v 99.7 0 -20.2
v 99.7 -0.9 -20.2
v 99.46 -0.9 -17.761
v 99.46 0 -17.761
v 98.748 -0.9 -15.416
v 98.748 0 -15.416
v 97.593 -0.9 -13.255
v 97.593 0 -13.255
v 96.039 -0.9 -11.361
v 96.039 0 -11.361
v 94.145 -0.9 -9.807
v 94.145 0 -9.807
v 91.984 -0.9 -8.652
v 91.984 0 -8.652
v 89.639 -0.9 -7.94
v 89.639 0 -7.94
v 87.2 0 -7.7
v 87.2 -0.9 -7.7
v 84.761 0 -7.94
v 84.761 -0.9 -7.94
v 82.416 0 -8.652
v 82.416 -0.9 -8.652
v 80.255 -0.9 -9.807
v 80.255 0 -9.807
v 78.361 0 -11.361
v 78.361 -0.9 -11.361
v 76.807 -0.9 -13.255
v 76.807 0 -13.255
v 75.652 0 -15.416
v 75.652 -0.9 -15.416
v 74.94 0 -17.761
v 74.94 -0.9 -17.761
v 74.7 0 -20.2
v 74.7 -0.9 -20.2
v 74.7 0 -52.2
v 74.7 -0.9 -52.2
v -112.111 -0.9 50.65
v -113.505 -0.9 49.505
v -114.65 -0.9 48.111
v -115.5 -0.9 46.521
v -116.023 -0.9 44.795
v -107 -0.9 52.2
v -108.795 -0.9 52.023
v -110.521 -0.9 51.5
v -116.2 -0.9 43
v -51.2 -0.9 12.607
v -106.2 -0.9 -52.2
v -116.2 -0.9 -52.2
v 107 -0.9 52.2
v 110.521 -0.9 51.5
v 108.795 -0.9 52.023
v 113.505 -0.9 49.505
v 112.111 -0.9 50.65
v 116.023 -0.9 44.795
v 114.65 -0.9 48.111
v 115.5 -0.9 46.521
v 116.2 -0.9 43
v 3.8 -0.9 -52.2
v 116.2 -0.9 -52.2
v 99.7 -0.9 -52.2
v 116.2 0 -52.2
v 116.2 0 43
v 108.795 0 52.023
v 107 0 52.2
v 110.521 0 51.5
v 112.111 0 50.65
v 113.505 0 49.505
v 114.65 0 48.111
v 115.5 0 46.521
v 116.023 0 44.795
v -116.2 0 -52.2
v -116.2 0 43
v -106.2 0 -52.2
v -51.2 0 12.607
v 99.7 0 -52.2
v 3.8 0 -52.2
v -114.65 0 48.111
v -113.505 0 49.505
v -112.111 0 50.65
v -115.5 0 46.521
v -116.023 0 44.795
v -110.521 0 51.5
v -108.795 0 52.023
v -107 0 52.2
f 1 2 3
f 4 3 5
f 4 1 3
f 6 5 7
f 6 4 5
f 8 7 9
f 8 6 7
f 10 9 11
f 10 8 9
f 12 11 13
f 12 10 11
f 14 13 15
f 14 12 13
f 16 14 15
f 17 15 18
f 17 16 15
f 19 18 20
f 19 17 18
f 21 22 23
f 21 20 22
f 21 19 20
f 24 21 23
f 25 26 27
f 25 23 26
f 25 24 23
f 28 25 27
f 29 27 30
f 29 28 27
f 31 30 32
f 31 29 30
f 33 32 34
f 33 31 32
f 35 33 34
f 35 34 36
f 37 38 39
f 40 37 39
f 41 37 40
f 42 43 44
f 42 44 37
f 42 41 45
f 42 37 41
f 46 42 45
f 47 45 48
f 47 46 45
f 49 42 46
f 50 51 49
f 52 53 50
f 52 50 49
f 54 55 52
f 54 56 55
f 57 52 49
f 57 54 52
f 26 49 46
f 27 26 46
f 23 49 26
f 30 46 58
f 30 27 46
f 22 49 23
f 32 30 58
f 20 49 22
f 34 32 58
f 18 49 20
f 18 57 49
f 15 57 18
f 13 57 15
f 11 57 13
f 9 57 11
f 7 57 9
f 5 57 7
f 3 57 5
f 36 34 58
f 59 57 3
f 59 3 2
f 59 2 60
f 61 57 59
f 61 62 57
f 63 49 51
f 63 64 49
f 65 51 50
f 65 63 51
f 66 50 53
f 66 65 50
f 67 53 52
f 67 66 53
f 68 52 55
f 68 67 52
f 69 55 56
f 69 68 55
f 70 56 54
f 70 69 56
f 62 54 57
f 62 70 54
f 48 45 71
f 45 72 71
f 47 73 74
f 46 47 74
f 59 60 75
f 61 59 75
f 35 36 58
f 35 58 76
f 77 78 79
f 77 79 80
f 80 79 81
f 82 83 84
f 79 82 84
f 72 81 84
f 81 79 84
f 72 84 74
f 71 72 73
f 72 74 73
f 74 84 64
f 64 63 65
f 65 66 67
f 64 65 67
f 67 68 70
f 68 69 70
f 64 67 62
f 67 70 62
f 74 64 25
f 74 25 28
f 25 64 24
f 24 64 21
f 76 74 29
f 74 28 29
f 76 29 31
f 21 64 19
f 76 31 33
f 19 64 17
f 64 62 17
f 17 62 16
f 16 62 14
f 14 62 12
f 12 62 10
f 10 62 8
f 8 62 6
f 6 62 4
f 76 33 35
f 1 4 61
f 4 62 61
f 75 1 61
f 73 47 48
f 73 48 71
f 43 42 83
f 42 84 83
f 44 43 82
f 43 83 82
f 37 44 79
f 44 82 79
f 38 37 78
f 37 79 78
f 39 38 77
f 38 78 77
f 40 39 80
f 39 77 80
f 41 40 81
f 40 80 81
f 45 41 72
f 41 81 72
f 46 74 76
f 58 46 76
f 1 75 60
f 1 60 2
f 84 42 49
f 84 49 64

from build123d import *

# Parameters (mm, degrees)
SKETCH1_W          = 104.4
SKETCH1_H          = 0.9
BASE_FLANGE1_DEPTH = 116.2
FILLET1_R          = 9.2
CUT_EXTRUDE1_DEPTH = 128.389520762
CUT_EXTRUDE2_DEPTH = 128.389520762


# Sheet-metal steps are written as plain solids
with BuildPart() as part:
    # Sketch1 → Base-Flange1 (new, symmetric)
    with BuildSketch(Plane(origin=(0, 0, 0), x_dir=(0, 0, -1), z_dir=(1, 0, 0))):
        with Locations((0, -0.45)):
            Rectangle(SKETCH1_W, SKETCH1_H)
    extrude(amount=BASE_FLANGE1_DEPTH, both=True)

    # Fillet1
    fillet1_edges = [part.edges().sort_by_distance(p)[0] for p in [
        (116.2, -0.45, 52.2),
        (-116.2, -0.45, 52.2),
    ]]
    fillet(fillet1_edges, radius=FILLET1_R)

    # Sketch2 → Cut-Extrude1 (cut, through all)
    with BuildSketch(Plane(origin=(0, 0, 0), x_dir=(1, 0, 0), z_dir=(0, 1, 0))):
        with BuildLine():
            Line((74.7, 52.2), (99.7, 52.2))
            Line((99.7, 52.2), (99.7, 20.2))
            ThreePointArc((99.7, 20.2), (87.2, 7.7), (74.7, 20.2))
            Line((74.7, 20.2), (74.7, 52.2))
        make_face()
    extrude(amount=-CUT_EXTRUDE1_DEPTH, mode=Mode.SUBTRACT)

    # Sketch3 → Cut-Extrude2 (cut, through all)
    with BuildSketch(Plane(origin=(0, 0, 0), x_dir=(1, 0, 0), z_dir=(0, 1, 0))):
        Polygon((-106.2, 52.2), (-51.2, -12.607406984), (3.8, 52.2), align=None)
    extrude(amount=-CUT_EXTRUDE2_DEPTH, mode=Mode.SUBTRACT)


solid = part.part
